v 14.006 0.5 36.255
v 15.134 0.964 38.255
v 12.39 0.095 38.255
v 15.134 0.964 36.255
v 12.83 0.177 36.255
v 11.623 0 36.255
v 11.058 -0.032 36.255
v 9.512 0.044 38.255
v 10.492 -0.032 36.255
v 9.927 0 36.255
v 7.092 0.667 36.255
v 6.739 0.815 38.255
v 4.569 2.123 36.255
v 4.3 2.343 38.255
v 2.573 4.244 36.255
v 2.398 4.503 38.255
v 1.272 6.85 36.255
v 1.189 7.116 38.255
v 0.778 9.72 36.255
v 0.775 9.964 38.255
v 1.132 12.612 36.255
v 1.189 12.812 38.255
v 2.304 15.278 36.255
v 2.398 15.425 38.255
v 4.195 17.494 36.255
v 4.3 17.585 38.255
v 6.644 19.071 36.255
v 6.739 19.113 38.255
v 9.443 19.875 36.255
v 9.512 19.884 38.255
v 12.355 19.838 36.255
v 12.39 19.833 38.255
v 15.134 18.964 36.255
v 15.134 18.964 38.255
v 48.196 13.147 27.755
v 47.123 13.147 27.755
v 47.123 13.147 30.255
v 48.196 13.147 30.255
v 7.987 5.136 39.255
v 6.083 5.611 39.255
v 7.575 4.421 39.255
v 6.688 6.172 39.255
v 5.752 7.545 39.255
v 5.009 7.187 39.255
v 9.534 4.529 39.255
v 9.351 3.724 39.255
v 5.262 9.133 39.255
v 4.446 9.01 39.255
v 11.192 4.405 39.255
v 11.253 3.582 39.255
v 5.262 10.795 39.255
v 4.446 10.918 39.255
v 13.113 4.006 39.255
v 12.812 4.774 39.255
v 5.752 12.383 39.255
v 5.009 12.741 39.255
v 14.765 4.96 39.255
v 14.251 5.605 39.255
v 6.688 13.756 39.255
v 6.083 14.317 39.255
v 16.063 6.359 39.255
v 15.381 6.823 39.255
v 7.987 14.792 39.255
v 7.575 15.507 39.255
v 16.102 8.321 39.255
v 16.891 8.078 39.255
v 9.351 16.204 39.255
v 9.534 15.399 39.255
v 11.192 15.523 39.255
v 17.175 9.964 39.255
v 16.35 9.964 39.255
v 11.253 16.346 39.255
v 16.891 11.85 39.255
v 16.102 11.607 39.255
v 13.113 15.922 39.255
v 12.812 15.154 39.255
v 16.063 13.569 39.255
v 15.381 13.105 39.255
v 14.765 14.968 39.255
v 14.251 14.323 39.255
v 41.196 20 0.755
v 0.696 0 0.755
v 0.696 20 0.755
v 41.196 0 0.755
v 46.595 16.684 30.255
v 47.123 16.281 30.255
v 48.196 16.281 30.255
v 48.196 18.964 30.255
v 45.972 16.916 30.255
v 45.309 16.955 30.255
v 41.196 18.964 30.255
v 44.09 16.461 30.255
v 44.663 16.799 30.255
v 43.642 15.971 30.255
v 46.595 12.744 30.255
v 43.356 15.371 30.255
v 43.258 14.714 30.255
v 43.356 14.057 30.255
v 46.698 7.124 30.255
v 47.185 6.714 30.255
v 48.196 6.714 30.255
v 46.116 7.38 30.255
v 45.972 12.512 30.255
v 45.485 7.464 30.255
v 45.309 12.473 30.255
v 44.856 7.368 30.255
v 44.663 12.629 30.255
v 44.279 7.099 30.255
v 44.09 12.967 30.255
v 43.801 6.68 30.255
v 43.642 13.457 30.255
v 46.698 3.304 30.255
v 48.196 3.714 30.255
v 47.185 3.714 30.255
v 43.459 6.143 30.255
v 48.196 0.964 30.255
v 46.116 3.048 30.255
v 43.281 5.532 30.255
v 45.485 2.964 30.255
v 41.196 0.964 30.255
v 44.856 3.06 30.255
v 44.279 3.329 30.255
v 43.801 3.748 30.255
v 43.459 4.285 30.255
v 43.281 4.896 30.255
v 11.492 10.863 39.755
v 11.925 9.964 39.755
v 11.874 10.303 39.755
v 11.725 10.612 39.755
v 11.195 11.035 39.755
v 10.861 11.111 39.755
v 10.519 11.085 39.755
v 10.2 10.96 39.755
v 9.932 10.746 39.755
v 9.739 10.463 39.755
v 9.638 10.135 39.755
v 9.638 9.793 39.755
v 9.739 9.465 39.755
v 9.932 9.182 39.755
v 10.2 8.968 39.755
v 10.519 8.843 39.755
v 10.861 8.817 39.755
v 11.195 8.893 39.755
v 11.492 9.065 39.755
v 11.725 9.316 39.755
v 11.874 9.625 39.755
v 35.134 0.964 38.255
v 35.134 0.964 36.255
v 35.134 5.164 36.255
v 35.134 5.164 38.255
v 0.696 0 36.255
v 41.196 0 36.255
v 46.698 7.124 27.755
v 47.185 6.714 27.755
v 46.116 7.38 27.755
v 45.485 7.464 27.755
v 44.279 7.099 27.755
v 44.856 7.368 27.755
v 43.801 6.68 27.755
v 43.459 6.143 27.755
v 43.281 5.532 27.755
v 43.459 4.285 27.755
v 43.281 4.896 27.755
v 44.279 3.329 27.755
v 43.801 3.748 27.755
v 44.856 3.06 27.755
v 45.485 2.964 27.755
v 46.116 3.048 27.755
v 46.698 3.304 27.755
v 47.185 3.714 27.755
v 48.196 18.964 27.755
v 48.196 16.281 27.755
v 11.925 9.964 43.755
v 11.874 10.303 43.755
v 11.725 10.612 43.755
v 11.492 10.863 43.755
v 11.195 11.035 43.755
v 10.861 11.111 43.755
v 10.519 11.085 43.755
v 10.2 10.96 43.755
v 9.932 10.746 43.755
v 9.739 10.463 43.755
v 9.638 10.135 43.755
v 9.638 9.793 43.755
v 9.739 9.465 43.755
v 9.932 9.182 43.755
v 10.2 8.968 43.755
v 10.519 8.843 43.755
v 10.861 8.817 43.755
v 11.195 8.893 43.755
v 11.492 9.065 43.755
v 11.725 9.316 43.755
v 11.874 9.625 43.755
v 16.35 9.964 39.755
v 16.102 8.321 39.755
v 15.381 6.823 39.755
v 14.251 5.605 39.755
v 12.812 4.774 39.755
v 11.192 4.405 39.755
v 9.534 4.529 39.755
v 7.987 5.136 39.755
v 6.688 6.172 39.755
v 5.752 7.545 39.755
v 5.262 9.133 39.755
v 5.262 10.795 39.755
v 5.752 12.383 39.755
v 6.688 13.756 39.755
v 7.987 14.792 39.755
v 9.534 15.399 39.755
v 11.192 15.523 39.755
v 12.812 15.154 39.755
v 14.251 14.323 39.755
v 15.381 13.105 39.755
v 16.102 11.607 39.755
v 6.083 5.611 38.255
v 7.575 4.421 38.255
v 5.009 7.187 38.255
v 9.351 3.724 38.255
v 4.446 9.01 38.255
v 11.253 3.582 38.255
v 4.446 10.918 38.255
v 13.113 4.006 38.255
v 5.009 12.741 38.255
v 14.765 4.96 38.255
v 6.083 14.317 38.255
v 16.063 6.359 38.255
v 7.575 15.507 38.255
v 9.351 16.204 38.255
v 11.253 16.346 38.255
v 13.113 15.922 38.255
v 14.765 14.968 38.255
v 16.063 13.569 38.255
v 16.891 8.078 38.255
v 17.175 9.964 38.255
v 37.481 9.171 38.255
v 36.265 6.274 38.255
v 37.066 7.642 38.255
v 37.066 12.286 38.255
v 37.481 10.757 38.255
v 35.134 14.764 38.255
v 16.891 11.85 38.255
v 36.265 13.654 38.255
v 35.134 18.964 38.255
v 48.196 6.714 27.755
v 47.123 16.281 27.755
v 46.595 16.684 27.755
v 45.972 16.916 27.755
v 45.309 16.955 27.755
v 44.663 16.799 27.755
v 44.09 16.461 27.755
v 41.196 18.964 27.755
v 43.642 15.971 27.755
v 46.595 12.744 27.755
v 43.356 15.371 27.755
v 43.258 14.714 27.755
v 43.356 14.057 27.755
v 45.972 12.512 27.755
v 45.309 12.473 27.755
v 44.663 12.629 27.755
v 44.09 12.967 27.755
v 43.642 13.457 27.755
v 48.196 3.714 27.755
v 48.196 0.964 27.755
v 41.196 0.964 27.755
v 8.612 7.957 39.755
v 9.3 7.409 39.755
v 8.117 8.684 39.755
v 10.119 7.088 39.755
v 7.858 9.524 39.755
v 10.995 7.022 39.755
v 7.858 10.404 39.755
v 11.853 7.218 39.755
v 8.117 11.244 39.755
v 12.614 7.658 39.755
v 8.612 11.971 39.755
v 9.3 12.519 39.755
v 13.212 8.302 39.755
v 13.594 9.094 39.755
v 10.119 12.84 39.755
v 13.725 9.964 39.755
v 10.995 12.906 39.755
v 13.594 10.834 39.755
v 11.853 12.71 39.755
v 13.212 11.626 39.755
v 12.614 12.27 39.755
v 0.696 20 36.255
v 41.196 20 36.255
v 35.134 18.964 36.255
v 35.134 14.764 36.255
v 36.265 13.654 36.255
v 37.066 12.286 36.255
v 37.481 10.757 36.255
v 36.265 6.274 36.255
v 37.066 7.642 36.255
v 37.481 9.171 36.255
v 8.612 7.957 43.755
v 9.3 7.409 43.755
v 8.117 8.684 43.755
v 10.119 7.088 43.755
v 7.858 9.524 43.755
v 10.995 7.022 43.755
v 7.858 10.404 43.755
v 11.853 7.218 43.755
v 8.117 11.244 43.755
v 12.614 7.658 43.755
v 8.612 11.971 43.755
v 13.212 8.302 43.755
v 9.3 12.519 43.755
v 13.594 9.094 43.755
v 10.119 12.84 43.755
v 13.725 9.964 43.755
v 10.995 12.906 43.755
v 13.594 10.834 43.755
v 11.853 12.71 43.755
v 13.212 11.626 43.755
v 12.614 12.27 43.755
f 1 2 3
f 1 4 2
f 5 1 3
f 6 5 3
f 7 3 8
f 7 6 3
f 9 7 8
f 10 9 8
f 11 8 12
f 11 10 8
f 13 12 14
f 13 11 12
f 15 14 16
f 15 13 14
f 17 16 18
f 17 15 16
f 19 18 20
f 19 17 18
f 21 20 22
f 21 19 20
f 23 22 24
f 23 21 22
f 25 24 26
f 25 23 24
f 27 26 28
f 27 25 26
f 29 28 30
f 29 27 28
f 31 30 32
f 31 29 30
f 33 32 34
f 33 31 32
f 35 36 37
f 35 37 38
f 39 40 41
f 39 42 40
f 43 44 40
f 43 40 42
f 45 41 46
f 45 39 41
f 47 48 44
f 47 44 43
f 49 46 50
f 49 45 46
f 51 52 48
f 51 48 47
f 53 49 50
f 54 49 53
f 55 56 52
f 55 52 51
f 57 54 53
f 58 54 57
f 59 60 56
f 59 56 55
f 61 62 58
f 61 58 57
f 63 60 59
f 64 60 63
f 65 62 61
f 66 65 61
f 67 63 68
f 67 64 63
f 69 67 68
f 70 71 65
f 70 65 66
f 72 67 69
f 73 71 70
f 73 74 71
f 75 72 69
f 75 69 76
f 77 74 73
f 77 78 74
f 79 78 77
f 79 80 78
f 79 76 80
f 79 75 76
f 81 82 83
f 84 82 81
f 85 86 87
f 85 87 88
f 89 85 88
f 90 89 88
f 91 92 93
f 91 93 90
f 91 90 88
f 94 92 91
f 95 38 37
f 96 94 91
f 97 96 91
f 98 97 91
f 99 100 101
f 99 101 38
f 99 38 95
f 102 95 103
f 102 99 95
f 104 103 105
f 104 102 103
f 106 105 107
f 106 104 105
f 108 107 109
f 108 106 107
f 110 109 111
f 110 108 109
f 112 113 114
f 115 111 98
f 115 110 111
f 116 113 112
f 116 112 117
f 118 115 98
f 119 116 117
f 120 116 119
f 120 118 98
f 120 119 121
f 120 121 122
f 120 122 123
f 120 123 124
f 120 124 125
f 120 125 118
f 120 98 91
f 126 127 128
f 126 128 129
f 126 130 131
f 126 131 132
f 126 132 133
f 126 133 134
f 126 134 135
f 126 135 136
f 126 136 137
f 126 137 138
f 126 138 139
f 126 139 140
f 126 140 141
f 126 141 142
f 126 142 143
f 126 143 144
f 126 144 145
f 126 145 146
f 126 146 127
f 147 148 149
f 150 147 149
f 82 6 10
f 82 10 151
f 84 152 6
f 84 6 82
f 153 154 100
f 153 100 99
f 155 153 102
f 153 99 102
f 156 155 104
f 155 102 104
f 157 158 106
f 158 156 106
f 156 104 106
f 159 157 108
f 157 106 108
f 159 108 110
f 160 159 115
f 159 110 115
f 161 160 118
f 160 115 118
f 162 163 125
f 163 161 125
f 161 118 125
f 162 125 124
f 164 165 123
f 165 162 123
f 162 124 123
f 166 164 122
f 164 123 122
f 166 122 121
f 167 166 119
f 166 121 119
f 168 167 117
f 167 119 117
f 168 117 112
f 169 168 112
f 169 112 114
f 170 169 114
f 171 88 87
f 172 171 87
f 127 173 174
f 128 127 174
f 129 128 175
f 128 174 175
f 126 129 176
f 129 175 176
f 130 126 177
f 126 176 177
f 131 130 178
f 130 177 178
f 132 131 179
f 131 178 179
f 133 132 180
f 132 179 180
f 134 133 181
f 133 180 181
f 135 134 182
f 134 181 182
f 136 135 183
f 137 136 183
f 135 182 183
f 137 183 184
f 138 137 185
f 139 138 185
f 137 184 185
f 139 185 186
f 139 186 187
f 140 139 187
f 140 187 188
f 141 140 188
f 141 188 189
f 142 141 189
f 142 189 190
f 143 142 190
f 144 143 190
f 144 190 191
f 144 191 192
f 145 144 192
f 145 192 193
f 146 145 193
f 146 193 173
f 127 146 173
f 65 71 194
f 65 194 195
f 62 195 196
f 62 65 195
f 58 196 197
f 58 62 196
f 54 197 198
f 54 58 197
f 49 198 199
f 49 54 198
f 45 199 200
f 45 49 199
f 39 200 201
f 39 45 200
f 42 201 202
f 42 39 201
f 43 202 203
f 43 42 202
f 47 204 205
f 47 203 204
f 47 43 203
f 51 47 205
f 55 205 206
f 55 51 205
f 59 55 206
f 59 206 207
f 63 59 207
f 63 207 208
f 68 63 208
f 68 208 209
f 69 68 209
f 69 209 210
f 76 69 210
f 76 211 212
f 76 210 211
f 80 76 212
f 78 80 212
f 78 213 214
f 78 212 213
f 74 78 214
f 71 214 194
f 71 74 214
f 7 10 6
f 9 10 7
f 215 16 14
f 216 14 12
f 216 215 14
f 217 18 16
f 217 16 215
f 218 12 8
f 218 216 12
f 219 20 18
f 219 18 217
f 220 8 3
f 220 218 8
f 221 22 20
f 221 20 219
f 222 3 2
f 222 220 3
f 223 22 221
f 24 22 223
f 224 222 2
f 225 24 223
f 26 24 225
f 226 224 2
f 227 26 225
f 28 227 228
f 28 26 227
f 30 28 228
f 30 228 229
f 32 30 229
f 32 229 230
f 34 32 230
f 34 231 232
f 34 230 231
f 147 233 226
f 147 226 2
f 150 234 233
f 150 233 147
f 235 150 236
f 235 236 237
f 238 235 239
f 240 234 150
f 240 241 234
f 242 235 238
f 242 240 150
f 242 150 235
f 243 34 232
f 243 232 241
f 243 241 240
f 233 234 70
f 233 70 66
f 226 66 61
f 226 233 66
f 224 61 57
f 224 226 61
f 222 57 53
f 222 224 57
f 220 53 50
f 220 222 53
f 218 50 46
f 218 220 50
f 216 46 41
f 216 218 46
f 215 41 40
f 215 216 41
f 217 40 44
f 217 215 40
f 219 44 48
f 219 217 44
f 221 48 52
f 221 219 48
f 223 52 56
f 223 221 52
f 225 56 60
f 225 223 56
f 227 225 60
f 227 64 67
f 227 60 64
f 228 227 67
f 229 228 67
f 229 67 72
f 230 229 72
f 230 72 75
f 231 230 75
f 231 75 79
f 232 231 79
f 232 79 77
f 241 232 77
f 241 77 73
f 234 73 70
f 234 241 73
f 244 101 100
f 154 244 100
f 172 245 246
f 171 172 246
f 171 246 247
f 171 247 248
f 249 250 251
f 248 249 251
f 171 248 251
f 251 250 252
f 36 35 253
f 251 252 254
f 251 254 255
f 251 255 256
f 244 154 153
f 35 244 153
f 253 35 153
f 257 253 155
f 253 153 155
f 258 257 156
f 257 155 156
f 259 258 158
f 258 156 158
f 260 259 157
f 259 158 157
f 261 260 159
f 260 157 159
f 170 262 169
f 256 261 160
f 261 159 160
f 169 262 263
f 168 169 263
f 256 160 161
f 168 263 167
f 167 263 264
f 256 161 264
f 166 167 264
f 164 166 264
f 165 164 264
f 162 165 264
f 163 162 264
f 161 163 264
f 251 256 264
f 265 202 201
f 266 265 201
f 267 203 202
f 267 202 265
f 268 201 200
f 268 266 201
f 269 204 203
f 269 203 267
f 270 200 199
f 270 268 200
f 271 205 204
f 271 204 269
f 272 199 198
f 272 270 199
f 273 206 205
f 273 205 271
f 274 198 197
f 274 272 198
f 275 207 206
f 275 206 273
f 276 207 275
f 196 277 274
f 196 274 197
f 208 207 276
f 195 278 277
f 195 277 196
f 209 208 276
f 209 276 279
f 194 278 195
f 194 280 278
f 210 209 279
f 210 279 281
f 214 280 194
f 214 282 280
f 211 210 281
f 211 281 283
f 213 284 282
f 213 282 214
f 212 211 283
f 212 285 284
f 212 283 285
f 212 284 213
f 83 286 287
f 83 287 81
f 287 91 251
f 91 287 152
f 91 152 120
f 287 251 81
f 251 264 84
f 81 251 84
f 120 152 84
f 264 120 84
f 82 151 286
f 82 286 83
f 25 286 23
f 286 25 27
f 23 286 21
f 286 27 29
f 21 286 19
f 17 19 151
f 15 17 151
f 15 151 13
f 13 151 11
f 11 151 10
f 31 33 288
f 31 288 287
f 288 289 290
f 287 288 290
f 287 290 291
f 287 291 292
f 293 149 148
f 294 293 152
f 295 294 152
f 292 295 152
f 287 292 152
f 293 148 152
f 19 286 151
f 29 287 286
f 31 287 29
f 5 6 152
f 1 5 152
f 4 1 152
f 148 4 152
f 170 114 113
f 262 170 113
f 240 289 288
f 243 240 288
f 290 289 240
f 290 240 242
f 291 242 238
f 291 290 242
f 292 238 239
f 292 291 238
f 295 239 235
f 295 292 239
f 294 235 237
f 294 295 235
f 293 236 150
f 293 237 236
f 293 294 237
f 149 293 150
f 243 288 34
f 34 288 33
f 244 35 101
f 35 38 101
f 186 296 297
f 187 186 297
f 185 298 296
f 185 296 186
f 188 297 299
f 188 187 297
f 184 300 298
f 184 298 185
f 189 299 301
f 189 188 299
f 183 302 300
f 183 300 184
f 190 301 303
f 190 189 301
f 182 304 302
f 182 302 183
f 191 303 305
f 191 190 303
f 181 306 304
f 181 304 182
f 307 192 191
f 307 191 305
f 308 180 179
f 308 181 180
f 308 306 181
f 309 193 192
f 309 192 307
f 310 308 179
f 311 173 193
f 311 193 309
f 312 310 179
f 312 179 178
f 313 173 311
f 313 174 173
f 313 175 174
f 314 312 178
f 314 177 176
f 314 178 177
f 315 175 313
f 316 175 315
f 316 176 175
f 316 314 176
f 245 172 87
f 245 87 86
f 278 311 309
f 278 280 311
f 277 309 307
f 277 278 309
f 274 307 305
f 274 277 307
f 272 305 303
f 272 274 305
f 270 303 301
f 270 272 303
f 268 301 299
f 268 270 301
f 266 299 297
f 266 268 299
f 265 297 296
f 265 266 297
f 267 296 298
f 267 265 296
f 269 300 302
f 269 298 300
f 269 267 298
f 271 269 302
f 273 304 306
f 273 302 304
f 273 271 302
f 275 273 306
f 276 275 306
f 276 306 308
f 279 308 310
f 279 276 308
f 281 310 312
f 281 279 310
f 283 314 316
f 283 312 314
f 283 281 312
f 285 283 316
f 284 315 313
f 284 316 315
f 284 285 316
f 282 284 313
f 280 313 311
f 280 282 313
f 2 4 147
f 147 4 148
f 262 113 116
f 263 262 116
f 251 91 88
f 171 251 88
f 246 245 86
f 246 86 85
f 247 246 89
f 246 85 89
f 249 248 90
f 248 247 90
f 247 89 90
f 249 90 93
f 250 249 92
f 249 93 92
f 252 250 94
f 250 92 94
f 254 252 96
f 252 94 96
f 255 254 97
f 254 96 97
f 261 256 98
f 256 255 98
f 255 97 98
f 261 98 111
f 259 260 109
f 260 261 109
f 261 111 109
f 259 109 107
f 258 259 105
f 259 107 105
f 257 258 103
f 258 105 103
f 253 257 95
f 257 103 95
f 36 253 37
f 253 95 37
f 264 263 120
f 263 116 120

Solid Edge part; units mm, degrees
sketch "Sketch1" plane through (0, 0, 0) normal (0, -1, 0) x (1, 0, 0)
  line L0 (0.6959, 36.2554) -> (0.6959, 0.7554)
  line L1 (0.6959, 0.7554) -> (41.1959, 0.7554)
  line L2 (41.1959, 36.2554) -> (41.1959, 0.7554)
  line L3 (0.6959, 36.2554) -> (41.1959, 36.2554)
  line L4 (-6.3041, 30.2554) -> (0.6959, 30.2554)
  line L5 (0.6959, 30.2554) -> (0.6959, 27.7554)
  line L6 (-6.3041, 27.7554) -> (0.6959, 27.7554)
  line L7 (-6.3041, 27.7554) -> (-6.3041, 30.2554)
  line L8 (48.1959, 27.7554) -> (41.1959, 27.7554)
  line L9 (41.1959, 30.2554) -> (41.1959, 27.7554)
  line L10 (48.1959, 30.2554) -> (41.1959, 30.2554)
  line L11 (48.1959, 27.7554) -> (48.1959, 30.2554)
extrude "Protrusion1" add sketch "Sketch1" against normal blind 20
sketch "Sketch2" plane through (-2.8041, 10, 30.2554) normal (0, 0, 1) x (1, 0, 0)
  line L0 (-3.5, 8.964) -> (3.5, 8.964)
  line L1 (3.5, 8.964) -> (3.5, 10.8897)
  line L2 (3.5, 10.8897) -> (-4.9405, 10.8897)
  line L3 (-4.9405, 10.8897) -> (-4.7039, -10.9349)
  line L4 (-4.7039, -10.9349) -> (3.5, -10.9349)
  line L5 (3.5, -10.9349) -> (3.5, -9.036)
  line L6 (3.5, -9.036) -> (-3.5, -9.036)
  line L7 (-3.5, -9.036) -> (-3.5, -6.286)
  line L8 (-3.5, -6.286) -> (-2.4891, -6.286)
  arc A0 (-2.4891, -6.286) -> (-2.4891, -3.286) centre (-0.812, -4.786) ccw
  line L9 (-2.4891, -3.286) -> (-3.5, -3.286)
  line L10 (-3.5, -3.286) -> (-3.5, 3.1474)
  line L11 (-3.5, 3.1474) -> (-2.4271, 3.1474)
  arc A1 (-2.4271, 3.1474) -> (-2.4271, 6.2806) centre (-0.812, 4.714) ccw
  line L12 (-2.4271, 6.2806) -> (-3.5, 6.2806)
  line L13 (-3.5, 6.2806) -> (-3.5, 8.964)
extrude "Cutout1" cut sketch "Sketch2" against normal up to vertex (2.5 mm away)
mirror "Mirror1" about plane through (20.9459, 10, 18.5054) normal (-1, 0, 0) of "Cutout1"
sketch "Sketch3" plane through (20.9459, 10, 36.2554) normal (0, 0, 1) x (1, 0, 0)
  arc A0 (-5.812, 8.964) -> (-5.812, -9.036) centre (-10.1709, -0.036) ccw
  line L0 (-5.812, -9.036) -> (14.188, -9.036)
  line L1 (14.188, -9.036) -> (14.188, -4.836)
  arc A1 (14.188, -4.836) -> (14.188, 4.764) centre (10.588, -0.036) ccw
  line L2 (14.188, 4.764) -> (14.188, 8.964)
  line L3 (14.188, 8.964) -> (-5.812, 8.964)
extrude "Protrusion2" add sketch "Sketch3" along normal up to vertex (2 mm away)
sketch "Sketch4" plane through (19.1544, 9.964, 38.2554) normal (0, 0, 1) x (1, 0, 0)
  circle A0 centre (-8.3794, 0) radius 6.4
extrude "Protrusion3" add sketch "Sketch4" along normal up to vertex (1 mm away)
sketch "Sketch5" plane through (10.775, 9.964, 39.2554) normal (0, 0, 1) x (1, 0, 0)
  circle A0 centre (0, 0) radius 5.575
extrude "Protrusion4" add sketch "Sketch5" along normal up to vertex (0.5 mm away)
sketch "Sketch6" plane through (10.775, 9.964, 39.7554) normal (0, 0, 1) x (1, 0, 0)
  circle A0 centre (0, 0) radius 2.95
extrude "Protrusion5" add sketch "Sketch6" along normal up to vertex (4 mm away)
sketch "Sketch7" plane through (10.775, 9.964, 43.7554) normal (0, 0, 1) x (1, 0, 0)
  circle A0 centre (0, 0) radius 1.15
extrude "Cutout3" cut sketch "Sketch7" against normal up to vertex (4 mm away)
sketch "Sketch8" plane through (20.9459, 0, 18.5054) normal (0, -1, 0) x (0, 0, 1)
  line L0 (17.75, 20.25) -> (-17.75, 20.25)
extrude "Enlèvement_matière_6" cut sketch "Sketch8" against normal blind 73.875 material side at (0.6459, 0, 18.5054)
